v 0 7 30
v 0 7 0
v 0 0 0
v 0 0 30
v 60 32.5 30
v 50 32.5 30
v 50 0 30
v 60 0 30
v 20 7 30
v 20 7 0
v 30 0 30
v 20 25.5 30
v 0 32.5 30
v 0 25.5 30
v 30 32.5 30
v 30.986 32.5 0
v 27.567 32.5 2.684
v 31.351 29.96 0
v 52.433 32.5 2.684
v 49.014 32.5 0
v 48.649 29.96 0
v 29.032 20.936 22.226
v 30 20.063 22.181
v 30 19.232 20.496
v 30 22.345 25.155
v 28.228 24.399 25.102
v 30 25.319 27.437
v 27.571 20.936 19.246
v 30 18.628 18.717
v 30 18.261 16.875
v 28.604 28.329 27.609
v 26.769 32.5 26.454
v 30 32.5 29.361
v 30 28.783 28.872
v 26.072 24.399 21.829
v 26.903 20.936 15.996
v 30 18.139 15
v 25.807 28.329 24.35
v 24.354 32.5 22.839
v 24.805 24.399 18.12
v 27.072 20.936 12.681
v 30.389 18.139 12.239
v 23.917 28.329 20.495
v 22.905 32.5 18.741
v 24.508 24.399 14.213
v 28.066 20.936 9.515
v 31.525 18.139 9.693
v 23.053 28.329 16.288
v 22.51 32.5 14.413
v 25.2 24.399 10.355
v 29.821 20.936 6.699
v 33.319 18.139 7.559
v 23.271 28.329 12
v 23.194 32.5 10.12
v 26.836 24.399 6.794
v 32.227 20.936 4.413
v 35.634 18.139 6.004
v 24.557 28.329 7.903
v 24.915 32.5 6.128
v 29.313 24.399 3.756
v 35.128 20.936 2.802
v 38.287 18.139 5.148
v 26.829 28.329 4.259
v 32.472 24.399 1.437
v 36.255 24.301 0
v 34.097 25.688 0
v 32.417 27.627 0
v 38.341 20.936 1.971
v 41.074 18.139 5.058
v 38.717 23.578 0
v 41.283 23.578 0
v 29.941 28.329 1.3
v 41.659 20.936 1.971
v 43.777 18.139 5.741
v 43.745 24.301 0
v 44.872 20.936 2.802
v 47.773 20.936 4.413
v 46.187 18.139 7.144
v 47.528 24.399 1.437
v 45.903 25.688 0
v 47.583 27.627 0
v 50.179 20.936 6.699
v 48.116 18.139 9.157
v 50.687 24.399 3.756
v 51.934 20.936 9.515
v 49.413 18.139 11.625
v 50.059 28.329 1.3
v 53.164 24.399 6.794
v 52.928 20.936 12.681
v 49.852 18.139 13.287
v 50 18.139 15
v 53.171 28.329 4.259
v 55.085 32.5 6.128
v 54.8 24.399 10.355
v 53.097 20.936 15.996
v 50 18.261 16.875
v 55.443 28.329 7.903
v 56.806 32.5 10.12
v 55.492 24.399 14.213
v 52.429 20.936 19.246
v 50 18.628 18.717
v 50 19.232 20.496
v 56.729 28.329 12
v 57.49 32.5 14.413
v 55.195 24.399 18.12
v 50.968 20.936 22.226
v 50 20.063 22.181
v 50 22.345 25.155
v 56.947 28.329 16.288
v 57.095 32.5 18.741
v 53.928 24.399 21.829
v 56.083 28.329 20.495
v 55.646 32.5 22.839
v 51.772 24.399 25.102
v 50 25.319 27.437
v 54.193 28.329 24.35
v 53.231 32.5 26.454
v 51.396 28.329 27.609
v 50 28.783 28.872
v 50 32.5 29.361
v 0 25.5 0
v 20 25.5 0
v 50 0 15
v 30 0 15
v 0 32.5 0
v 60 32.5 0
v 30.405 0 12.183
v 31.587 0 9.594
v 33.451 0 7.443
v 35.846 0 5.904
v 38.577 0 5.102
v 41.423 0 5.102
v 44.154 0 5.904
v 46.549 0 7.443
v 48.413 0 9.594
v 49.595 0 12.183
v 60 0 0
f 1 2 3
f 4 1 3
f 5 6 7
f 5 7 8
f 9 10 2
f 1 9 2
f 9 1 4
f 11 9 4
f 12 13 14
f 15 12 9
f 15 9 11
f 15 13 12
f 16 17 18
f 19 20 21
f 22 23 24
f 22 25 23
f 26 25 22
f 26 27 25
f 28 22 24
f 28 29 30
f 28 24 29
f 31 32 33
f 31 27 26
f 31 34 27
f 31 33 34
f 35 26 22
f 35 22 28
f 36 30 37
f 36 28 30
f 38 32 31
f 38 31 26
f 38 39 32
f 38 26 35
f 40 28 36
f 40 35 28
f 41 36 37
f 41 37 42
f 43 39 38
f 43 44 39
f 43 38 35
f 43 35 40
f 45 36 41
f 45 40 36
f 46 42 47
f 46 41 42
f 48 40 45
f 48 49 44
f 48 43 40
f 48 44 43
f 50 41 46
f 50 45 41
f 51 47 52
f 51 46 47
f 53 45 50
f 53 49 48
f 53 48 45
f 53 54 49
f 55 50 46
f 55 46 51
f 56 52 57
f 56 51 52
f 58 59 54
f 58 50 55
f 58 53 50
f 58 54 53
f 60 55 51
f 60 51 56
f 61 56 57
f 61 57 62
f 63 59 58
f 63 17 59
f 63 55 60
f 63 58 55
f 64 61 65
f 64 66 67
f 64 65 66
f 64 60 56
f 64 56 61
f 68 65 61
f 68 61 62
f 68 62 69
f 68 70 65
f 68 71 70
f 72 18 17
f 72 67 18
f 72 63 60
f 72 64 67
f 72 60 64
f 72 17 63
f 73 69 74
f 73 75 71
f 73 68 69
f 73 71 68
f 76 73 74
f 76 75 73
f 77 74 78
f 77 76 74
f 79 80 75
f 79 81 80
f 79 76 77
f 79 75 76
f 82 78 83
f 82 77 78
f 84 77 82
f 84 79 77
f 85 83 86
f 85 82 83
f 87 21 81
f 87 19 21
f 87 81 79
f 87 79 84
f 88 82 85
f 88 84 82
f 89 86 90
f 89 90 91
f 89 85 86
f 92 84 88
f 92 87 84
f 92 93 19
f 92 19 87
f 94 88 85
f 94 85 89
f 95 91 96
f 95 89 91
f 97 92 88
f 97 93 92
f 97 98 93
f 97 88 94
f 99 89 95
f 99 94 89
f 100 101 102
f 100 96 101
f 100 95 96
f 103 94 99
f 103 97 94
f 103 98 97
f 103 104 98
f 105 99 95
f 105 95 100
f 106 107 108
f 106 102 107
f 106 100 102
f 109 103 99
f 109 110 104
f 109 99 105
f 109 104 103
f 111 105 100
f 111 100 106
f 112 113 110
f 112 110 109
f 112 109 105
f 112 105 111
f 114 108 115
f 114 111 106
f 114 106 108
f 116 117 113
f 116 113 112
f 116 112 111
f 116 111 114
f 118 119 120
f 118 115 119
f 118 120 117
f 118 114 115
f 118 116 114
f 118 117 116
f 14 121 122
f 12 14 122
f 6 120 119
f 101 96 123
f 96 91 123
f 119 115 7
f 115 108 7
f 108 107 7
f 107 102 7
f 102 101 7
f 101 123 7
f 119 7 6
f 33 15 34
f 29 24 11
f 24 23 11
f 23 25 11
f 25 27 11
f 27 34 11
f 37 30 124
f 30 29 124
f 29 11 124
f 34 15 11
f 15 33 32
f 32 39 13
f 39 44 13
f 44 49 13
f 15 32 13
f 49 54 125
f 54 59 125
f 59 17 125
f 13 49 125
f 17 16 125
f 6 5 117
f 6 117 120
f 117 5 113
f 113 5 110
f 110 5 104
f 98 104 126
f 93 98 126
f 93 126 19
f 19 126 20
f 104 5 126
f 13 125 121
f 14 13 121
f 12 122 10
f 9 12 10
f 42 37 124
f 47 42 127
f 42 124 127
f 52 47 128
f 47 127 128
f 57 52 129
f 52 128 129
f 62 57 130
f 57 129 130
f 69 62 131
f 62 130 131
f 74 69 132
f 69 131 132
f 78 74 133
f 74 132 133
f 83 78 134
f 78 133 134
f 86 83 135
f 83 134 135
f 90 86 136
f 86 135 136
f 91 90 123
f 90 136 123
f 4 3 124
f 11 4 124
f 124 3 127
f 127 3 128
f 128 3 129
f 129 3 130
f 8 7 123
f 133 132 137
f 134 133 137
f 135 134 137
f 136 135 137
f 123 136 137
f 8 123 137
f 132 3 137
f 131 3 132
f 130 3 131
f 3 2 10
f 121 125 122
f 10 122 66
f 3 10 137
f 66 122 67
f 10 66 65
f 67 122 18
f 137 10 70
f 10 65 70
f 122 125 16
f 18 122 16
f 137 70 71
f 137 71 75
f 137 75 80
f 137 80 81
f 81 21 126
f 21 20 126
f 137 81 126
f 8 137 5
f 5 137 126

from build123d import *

# Parameters (mm, degrees)
F1_DEPTH = 30
F3_DEPTH = 32.501


with BuildPart() as f1:
    # F0 (on Top) → F1 (new body)
    with BuildSketch(Plane.XY):
        Polygon((0, 7), (0, 0), (60, 0), (60, 32.5), (0, 32.5), (0, 25.5), (20, 25.5), (20, 7), align=None)
    extrude(amount=F1_DEPTH)

    # F2 (on face) → F3 (cut, through all)
    with BuildSketch(Plane.XZ):
        with BuildLine():
            ThreePointArc((30, 15), (40, 5), (50, 15))
            ThreePointArc((50, 15), (40, 25), (30, 15))
        make_face()
        with BuildLine():
            ThreePointArc((30, 15), (40, 25), (50, 15))
            Line((50, 15), (50, 30))
            Line((50, 30), (30, 30))
            Line((30, 30), (30, 15))
        make_face()
    extrude(amount=-F3_DEPTH, mode=Mode.SUBTRACT)

    # F5 (on plane+point) → F6 (revolve, cut)
    with BuildSketch(Plane.XY.offset(15)):
        with BuildLine():
            ThreePointArc((40, 15), (52.3743686708, 20.1256313292), (57.5, 32.5))
            Line((57.5, 32.5), (40, 32.5))
            Line((40, 32.5), (40, 15))
        make_face()
    revolve(axis=Axis((40, 23.75, 15), (0, -1, 0)), mode=Mode.SUBTRACT)


solid = f1.part
